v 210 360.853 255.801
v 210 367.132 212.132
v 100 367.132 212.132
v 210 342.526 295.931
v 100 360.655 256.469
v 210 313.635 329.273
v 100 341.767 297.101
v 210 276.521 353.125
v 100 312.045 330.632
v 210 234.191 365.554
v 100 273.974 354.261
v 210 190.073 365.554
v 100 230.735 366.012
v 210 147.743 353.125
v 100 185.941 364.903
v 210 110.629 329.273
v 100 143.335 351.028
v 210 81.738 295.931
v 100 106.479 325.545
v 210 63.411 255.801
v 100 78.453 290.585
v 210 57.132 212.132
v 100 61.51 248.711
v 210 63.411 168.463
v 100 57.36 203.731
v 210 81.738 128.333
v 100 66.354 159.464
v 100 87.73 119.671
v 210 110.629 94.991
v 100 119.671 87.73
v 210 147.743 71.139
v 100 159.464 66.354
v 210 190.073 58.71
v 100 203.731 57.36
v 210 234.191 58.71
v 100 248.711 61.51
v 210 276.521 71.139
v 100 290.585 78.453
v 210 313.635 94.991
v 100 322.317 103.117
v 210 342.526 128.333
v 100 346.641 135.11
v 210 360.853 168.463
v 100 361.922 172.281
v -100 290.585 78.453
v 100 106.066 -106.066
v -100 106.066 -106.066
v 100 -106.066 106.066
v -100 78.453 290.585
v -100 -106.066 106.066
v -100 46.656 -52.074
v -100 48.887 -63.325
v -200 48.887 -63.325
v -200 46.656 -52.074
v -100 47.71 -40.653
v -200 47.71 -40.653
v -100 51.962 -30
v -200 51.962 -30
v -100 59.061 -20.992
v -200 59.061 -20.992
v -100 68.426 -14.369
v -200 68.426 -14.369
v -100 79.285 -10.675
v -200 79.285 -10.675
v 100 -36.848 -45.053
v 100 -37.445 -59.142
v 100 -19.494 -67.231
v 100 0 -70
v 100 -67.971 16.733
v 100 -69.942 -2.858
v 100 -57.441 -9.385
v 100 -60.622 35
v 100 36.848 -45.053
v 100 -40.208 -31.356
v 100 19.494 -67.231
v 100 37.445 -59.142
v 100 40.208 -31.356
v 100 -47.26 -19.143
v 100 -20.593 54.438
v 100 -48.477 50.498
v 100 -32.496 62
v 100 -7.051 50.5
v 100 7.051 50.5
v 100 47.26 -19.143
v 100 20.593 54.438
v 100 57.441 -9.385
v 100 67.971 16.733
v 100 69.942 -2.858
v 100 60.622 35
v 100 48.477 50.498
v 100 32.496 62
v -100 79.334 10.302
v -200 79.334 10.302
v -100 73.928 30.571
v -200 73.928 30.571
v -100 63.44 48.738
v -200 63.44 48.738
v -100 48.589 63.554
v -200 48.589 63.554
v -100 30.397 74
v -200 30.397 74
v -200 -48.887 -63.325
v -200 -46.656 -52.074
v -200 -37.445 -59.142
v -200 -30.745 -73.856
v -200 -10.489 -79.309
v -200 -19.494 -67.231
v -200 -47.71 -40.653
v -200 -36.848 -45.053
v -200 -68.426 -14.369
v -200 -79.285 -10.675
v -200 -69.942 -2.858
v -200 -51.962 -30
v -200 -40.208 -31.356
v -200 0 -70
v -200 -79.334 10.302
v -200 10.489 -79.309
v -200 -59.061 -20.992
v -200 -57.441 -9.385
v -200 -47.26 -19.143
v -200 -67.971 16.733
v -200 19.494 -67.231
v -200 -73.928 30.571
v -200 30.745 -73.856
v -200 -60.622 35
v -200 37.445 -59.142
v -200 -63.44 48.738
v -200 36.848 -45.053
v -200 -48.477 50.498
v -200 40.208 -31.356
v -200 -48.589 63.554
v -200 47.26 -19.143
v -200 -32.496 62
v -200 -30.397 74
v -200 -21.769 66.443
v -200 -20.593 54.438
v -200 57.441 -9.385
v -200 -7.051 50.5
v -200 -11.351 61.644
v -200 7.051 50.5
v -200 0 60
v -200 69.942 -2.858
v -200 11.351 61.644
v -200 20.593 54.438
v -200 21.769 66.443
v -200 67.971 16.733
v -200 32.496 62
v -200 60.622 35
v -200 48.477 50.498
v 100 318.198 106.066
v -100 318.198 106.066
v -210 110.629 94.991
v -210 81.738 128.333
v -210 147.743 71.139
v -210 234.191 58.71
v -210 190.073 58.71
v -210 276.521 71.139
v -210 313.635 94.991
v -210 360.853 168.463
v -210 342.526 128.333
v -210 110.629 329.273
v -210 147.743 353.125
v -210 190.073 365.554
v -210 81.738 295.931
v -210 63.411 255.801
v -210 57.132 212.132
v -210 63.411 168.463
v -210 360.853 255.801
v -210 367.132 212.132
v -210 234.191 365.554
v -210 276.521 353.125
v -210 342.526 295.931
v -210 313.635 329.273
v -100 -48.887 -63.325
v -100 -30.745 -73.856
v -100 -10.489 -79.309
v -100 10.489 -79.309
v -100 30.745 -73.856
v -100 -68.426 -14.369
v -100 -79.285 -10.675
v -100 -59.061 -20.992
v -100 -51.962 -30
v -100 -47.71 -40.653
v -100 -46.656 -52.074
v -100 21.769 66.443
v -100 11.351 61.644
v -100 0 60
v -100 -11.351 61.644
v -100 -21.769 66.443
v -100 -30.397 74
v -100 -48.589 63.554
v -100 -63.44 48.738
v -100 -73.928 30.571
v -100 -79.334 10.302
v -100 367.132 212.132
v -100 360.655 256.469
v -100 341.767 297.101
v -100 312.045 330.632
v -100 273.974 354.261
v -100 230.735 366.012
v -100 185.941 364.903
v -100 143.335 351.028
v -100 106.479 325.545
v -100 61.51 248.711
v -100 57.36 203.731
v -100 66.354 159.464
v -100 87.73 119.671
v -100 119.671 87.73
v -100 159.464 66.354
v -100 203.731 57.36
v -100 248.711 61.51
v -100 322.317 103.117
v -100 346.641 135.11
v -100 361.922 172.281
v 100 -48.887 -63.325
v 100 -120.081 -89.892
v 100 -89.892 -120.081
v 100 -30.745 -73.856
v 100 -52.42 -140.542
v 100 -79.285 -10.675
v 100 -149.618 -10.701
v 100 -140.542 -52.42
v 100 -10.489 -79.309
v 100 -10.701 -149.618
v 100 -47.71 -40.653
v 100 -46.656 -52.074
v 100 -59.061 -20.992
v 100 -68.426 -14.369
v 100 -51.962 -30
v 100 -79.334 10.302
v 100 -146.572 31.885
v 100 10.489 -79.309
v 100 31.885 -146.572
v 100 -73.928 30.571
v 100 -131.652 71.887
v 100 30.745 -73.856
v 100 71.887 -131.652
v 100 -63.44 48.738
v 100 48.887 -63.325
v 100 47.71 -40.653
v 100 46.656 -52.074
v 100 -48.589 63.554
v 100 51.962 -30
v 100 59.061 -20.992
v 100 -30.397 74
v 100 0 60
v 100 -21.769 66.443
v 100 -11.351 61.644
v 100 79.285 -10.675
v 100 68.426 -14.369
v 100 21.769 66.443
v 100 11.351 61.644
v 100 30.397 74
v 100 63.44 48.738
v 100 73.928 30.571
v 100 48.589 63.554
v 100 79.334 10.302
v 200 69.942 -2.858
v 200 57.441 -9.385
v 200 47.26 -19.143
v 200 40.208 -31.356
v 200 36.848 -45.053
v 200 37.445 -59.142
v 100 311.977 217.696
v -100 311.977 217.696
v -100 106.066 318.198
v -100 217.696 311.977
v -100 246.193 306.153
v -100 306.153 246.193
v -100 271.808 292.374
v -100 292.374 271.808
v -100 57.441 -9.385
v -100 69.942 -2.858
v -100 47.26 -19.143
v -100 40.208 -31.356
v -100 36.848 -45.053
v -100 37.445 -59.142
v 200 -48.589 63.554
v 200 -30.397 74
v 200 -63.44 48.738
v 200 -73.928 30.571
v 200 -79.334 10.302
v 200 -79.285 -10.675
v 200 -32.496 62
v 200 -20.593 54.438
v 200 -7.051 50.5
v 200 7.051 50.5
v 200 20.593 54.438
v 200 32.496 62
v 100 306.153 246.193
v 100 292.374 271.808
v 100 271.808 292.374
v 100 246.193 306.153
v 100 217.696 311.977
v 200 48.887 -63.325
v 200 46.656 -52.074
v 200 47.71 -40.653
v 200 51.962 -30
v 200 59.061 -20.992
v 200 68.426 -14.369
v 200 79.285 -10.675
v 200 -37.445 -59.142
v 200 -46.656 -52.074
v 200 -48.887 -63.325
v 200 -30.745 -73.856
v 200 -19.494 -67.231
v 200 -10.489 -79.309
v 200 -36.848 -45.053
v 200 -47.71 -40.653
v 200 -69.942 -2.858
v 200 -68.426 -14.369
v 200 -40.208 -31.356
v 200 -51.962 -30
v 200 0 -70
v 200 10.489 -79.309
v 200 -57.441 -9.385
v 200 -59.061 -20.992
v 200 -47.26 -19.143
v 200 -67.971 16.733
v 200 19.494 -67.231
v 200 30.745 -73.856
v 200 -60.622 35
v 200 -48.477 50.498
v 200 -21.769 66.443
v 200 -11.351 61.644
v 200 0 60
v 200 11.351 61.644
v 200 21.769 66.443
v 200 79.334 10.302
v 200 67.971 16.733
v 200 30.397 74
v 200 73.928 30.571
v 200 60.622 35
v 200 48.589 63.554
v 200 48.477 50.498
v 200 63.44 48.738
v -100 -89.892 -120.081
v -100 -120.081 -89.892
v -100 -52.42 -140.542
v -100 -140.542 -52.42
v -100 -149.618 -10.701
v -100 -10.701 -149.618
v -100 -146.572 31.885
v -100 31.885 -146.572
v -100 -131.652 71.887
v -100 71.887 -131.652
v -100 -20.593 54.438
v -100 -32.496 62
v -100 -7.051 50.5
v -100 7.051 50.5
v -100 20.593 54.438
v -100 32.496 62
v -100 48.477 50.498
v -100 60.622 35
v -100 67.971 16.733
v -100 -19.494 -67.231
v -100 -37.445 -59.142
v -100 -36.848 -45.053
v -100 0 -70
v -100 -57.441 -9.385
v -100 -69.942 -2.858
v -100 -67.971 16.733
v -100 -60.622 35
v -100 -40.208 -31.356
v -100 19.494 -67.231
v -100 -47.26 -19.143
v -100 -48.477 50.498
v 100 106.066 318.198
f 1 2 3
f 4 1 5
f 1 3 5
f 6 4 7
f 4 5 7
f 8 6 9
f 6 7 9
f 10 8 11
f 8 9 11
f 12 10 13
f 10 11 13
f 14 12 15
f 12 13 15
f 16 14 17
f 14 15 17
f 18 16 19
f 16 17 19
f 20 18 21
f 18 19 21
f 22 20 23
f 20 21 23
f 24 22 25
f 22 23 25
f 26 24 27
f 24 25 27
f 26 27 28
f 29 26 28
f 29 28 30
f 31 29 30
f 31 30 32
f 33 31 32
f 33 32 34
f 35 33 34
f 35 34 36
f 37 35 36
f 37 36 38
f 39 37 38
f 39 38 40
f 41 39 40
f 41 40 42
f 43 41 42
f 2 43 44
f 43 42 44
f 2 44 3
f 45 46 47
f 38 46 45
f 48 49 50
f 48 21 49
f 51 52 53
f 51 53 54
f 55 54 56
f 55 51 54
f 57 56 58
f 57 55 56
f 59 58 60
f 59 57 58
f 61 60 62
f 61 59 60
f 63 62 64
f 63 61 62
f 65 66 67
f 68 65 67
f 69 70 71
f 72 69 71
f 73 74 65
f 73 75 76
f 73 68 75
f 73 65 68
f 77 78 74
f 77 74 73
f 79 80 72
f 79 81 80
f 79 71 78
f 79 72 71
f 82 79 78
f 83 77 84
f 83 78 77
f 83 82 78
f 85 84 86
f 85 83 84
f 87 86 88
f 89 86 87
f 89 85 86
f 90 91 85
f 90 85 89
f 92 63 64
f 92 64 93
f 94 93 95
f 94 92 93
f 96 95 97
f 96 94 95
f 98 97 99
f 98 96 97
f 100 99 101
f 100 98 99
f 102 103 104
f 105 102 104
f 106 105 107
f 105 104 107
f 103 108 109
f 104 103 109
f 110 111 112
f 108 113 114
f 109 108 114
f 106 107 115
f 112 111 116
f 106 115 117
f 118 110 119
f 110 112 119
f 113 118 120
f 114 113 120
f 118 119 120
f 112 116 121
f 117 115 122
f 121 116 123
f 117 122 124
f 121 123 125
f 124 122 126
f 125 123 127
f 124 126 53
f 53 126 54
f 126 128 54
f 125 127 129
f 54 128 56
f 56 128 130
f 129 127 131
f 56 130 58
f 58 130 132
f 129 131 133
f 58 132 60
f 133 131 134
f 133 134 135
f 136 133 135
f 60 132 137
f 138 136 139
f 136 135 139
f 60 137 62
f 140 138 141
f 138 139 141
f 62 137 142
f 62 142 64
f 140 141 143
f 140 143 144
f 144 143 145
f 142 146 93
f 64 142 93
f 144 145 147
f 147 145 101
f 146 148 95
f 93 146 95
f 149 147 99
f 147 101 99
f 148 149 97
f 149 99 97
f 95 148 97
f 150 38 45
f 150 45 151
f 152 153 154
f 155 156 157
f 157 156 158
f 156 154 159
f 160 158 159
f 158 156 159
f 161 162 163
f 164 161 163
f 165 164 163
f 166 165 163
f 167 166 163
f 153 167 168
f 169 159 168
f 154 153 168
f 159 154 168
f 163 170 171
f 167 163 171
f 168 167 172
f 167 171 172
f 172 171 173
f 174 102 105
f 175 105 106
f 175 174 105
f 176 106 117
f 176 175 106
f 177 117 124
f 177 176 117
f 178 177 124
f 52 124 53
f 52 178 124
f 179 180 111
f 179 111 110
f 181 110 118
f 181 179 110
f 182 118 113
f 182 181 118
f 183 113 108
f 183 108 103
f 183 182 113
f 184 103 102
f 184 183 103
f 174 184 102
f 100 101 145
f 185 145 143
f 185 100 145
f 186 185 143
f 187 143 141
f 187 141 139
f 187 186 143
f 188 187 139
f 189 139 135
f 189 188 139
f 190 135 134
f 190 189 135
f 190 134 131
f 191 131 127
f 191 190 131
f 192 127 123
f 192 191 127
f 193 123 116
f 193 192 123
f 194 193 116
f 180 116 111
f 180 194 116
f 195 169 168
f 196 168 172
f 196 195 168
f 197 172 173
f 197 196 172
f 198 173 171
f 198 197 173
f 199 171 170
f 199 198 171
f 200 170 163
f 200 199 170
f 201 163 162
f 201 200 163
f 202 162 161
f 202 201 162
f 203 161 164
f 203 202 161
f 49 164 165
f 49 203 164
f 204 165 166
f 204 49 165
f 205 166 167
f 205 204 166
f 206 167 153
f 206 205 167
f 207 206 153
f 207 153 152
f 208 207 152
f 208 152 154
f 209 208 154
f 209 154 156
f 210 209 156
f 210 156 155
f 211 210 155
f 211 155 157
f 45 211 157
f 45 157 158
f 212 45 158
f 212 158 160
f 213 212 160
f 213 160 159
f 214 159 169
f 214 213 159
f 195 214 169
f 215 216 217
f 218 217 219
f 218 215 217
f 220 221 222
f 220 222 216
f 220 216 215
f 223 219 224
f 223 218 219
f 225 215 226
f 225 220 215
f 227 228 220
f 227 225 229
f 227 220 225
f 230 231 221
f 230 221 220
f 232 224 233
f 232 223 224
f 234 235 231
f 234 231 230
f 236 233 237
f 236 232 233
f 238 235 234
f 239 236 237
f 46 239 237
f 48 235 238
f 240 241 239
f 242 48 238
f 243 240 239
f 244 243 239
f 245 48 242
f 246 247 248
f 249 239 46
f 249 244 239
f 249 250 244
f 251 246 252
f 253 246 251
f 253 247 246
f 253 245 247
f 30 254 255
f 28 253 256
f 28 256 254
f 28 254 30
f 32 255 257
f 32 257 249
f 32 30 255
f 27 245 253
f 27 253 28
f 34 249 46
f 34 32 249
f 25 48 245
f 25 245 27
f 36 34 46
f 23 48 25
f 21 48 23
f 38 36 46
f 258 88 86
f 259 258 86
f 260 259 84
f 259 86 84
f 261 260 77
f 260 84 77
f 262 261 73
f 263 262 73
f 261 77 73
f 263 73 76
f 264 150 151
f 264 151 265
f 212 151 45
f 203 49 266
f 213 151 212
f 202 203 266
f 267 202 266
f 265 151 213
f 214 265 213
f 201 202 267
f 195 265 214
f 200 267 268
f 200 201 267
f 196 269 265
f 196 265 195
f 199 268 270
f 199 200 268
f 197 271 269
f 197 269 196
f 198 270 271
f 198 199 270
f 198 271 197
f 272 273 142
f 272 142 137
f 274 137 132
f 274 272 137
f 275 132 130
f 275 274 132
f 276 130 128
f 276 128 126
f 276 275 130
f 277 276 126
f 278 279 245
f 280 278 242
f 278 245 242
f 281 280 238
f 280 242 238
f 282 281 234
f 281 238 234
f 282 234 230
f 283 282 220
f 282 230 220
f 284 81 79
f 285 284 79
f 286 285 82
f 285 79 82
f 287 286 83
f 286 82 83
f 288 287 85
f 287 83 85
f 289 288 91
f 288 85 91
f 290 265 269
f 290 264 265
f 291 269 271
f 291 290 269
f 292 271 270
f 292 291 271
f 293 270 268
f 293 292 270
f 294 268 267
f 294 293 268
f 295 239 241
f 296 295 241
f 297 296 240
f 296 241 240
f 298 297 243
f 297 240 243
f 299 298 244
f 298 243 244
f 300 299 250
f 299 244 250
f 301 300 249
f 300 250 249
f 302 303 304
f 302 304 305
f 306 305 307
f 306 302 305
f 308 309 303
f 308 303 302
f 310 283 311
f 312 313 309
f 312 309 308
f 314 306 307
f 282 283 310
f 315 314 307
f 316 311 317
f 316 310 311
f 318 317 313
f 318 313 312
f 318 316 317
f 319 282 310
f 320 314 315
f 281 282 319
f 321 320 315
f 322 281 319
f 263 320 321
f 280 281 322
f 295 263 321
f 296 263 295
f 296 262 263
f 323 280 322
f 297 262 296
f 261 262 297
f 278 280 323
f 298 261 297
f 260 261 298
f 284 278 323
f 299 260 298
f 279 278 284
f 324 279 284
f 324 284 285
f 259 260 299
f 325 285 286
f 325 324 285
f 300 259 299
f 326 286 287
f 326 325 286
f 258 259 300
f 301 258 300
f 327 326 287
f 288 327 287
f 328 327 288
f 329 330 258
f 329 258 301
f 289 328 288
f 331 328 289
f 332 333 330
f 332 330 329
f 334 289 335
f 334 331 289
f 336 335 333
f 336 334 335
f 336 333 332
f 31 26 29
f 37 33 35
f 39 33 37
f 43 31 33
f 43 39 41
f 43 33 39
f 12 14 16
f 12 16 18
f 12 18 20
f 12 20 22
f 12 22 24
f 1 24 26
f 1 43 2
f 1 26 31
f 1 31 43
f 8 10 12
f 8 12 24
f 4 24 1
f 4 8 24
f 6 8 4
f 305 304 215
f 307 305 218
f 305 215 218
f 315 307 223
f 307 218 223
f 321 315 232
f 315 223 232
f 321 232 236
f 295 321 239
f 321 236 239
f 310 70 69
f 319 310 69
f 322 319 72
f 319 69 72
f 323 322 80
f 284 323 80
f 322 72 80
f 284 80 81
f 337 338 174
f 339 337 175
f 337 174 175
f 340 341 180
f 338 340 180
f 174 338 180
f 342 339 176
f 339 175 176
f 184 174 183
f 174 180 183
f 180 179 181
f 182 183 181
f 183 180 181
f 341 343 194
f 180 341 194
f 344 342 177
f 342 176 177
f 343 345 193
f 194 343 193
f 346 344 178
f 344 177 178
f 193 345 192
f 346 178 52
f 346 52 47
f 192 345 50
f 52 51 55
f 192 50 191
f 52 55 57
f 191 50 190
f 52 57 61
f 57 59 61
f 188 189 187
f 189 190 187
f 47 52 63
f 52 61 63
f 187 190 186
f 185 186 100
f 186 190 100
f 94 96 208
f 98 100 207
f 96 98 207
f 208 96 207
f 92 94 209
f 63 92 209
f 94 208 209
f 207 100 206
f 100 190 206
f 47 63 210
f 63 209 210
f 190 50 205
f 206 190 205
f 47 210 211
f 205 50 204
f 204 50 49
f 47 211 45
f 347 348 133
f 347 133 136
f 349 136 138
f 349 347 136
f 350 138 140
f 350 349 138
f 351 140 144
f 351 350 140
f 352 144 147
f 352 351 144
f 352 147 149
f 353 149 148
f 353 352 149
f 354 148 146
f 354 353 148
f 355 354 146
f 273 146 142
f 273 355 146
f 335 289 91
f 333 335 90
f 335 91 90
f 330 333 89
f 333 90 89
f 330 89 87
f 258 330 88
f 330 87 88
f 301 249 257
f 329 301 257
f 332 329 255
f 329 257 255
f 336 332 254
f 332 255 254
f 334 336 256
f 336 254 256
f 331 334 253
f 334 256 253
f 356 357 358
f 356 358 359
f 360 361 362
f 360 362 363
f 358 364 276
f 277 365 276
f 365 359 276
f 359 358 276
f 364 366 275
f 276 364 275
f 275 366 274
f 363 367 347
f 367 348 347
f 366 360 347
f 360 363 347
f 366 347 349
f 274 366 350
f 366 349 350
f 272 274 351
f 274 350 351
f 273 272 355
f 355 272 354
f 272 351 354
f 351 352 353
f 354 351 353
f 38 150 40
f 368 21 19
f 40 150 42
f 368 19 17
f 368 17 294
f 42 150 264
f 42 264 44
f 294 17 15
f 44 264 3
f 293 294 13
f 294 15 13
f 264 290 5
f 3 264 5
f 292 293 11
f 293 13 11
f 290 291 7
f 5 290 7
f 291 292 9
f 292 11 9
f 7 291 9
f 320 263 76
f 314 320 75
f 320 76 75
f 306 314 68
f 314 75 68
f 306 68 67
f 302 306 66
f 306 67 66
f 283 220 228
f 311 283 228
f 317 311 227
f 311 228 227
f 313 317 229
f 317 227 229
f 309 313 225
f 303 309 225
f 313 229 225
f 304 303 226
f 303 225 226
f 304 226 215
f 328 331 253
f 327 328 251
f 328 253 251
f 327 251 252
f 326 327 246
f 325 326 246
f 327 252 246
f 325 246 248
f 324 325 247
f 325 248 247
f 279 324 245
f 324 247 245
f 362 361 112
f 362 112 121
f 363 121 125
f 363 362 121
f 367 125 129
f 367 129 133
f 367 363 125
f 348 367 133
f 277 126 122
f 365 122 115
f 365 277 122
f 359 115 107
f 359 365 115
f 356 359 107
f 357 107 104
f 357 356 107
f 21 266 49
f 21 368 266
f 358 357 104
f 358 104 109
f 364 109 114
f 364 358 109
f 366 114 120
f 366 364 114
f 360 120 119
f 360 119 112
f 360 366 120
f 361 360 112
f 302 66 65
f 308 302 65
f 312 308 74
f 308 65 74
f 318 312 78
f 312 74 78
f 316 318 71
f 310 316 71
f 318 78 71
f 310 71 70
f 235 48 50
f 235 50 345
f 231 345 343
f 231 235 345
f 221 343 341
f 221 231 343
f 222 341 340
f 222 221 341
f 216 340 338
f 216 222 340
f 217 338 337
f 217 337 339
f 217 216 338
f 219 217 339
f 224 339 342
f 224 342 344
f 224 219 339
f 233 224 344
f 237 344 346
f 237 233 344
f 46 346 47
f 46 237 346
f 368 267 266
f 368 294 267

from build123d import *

# Parameters (mm, degrees)
F1_DEPTH = 100
F2_START = 100
F2_DEPTH = 110
F3_DEPTH = 200


with BuildPart() as f1:
    # F0 (on Right) → F1 (new body)
    with BuildSketch(Plane.YZ):
        with BuildLine():
            Line((78.452614635, 290.584648991), (-106.066017178, 106.066017178))
            ThreePointArc((-106.066017178, 106.066017178), (-106.066017178, -106.066017178), (106.066017178, -106.066017178))
            Line((106.066017178, -106.066017178), (290.584648991, 78.452614635))
            ThreePointArc((290.584648991, 78.452614635), (102.530483272, 102.530483272), (78.452614635, 290.584648991))
        make_face()
        with BuildLine():
            ThreePointArc((-79.2845640336, -10.6751068378), (-69.2820323028, 40), (-30.3973683071, 74))
            ThreePointArc((-30.3973683071, 74), (0, 60), (30.3973683071, 74))
            ThreePointArc((30.3973683071, 74), (69.2820323028, 40), (79.2845640336, -10.6751068378))
            ThreePointArc((79.2845640336, -10.6751068378), (51.9615242271, -30), (48.8871957265, -63.3248931622))
            ThreePointArc((48.8871957265, -63.3248931622), (0, -80), (-48.8871957265, -63.3248931622))
            ThreePointArc((-48.8871957265, -63.3248931622), (-51.9615242271, -30), (-79.2845640336, -10.6751068378))
        make_face(mode=Mode.SUBTRACT)
        with BuildLine():
            Line((106.066017178, 318.1980515339), (78.452614635, 290.584648991))
            ThreePointArc((78.452614635, 290.584648991), (102.530483272, 102.530483272), (290.584648991, 78.452614635))
            Line((290.584648991, 78.452614635), (318.1980515339, 106.066017178))
            Line((318.1980515339, 106.066017178), (311.9771141045, 217.6962099463))
            ThreePointArc((311.9771141045, 217.6962099463), (282.8427124746, 282.8427124746), (217.6962099463, 311.9771141045))
            Line((217.6962099463, 311.9771141045), (106.066017178, 318.1980515339))
        make_face()
        with BuildLine():
            ThreePointArc((30.3973683071, 74), (0, 60), (-30.3973683071, 74))
            ThreePointArc((-30.3973683071, 74), (-69.2820323028, 40), (-79.2845640336, -10.6751068378))
            ThreePointArc((-79.2845640336, -10.6751068378), (-51.9615242271, -30), (-48.8871957265, -63.3248931622))
            ThreePointArc((-48.8871957265, -63.3248931622), (0, -80), (48.8871957265, -63.3248931622))
            ThreePointArc((48.8871957265, -63.3248931622), (51.9615242271, -30), (79.2845640336, -10.6751068378))
            ThreePointArc((79.2845640336, -10.6751068378), (69.2820323028, 40), (30.3973683071, 74))
        make_face()
        with BuildLine():
            ThreePointArc((-69.9416518439, -2.8575054411), (-60.6217782649, 35), (-32.4961536185, 62))
            ThreePointArc((-32.4961536185, 62), (0, 50), (32.4961536185, 62))
            ThreePointArc((32.4961536185, 62), (60.6217782649, 35), (69.9416518439, -2.8575054411))
            ThreePointArc((69.9416518439, -2.8575054411), (43.3012701892, -25), (37.4454982254, -59.1424945589))
            ThreePointArc((37.4454982254, -59.1424945589), (0, -70), (-37.4454982254, -59.1424945589))
            ThreePointArc((-37.4454982254, -59.1424945589), (-43.3012701892, -25), (-69.9416518439, -2.8575054411))
        make_face(mode=Mode.SUBTRACT)
        with BuildLine():
            ThreePointArc((32.4961536185, 62), (0, 50), (-32.4961536185, 62))
            ThreePointArc((-32.4961536185, 62), (-60.6217782649, 35), (-69.9416518439, -2.8575054411))
            ThreePointArc((-69.9416518439, -2.8575054411), (-43.3012701892, -25), (-37.4454982254, -59.1424945589))
            ThreePointArc((-37.4454982254, -59.1424945589), (0, -70), (37.4454982254, -59.1424945589))
            ThreePointArc((37.4454982254, -59.1424945589), (43.3012701892, -25), (69.9416518439, -2.8575054411))
            ThreePointArc((69.9416518439, -2.8575054411), (60.6217782649, 35), (32.4961536185, 62))
        make_face()
    extrude(amount=F1_DEPTH)

    # F0 (on Right) → F2 (join)
    with BuildSketch(Plane.YZ.offset(F2_START)):
        with BuildLine():
            Line((106.066017178, 318.1980515339), (78.452614635, 290.584648991))
            ThreePointArc((78.452614635, 290.584648991), (102.530483272, 102.530483272), (290.584648991, 78.452614635))
            Line((290.584648991, 78.452614635), (318.1980515339, 106.066017178))
            Line((318.1980515339, 106.066017178), (311.9771141045, 217.6962099463))
            ThreePointArc((311.9771141045, 217.6962099463), (282.8427124746, 282.8427124746), (217.6962099463, 311.9771141045))
            Line((217.6962099463, 311.9771141045), (106.066017178, 318.1980515339))
        make_face()
        with BuildLine():
            ThreePointArc((367.132034356, 212.132034356), (252.7810807362, 361.7069487914), (78.452614635, 290.584648991))
            Line((78.452614635, 290.584648991), (106.066017178, 318.1980515339))
            Line((106.066017178, 318.1980515339), (217.6962099463, 311.9771141045))
            ThreePointArc((217.6962099463, 311.9771141045), (282.8427124746, 282.8427124746), (311.9771141045, 217.6962099463))
            Line((311.9771141045, 217.6962099463), (318.1980515339, 106.066017178))
            Line((318.1980515339, 106.066017178), (290.584648991, 78.452614635))
            ThreePointArc((290.584648991, 78.452614635), (346.6406869929, 135.1098144075), (367.132034356, 212.132034356))
        make_face()
    extrude(amount=F2_DEPTH)

    # F0 (on Right) → F3 (join)
    with BuildSketch(Plane.YZ):
        with BuildLine():
            ThreePointArc((30.3973683071, 74), (0, 60), (-30.3973683071, 74))
            ThreePointArc((-30.3973683071, 74), (-69.2820323028, 40), (-79.2845640336, -10.6751068378))
            ThreePointArc((-79.2845640336, -10.6751068378), (-51.9615242271, -30), (-48.8871957265, -63.3248931622))
            ThreePointArc((-48.8871957265, -63.3248931622), (0, -80), (48.8871957265, -63.3248931622))
            ThreePointArc((48.8871957265, -63.3248931622), (51.9615242271, -30), (79.2845640336, -10.6751068378))
            ThreePointArc((79.2845640336, -10.6751068378), (69.2820323028, 40), (30.3973683071, 74))
        make_face()
        with BuildLine():
            ThreePointArc((-69.9416518439, -2.8575054411), (-60.6217782649, 35), (-32.4961536185, 62))
            ThreePointArc((-32.4961536185, 62), (0, 50), (32.4961536185, 62))
            ThreePointArc((32.4961536185, 62), (60.6217782649, 35), (69.9416518439, -2.8575054411))
            ThreePointArc((69.9416518439, -2.8575054411), (43.3012701892, -25), (37.4454982254, -59.1424945589))
            ThreePointArc((37.4454982254, -59.1424945589), (0, -70), (-37.4454982254, -59.1424945589))
            ThreePointArc((-37.4454982254, -59.1424945589), (-43.3012701892, -25), (-69.9416518439, -2.8575054411))
        make_face(mode=Mode.SUBTRACT)
    extrude(amount=F3_DEPTH)

    # F4: F1 across face


with BuildPart() as f1_1:
    add(f1.part)
    add(f1.part.mirror(Plane.YZ))


solid = f1_1.part
